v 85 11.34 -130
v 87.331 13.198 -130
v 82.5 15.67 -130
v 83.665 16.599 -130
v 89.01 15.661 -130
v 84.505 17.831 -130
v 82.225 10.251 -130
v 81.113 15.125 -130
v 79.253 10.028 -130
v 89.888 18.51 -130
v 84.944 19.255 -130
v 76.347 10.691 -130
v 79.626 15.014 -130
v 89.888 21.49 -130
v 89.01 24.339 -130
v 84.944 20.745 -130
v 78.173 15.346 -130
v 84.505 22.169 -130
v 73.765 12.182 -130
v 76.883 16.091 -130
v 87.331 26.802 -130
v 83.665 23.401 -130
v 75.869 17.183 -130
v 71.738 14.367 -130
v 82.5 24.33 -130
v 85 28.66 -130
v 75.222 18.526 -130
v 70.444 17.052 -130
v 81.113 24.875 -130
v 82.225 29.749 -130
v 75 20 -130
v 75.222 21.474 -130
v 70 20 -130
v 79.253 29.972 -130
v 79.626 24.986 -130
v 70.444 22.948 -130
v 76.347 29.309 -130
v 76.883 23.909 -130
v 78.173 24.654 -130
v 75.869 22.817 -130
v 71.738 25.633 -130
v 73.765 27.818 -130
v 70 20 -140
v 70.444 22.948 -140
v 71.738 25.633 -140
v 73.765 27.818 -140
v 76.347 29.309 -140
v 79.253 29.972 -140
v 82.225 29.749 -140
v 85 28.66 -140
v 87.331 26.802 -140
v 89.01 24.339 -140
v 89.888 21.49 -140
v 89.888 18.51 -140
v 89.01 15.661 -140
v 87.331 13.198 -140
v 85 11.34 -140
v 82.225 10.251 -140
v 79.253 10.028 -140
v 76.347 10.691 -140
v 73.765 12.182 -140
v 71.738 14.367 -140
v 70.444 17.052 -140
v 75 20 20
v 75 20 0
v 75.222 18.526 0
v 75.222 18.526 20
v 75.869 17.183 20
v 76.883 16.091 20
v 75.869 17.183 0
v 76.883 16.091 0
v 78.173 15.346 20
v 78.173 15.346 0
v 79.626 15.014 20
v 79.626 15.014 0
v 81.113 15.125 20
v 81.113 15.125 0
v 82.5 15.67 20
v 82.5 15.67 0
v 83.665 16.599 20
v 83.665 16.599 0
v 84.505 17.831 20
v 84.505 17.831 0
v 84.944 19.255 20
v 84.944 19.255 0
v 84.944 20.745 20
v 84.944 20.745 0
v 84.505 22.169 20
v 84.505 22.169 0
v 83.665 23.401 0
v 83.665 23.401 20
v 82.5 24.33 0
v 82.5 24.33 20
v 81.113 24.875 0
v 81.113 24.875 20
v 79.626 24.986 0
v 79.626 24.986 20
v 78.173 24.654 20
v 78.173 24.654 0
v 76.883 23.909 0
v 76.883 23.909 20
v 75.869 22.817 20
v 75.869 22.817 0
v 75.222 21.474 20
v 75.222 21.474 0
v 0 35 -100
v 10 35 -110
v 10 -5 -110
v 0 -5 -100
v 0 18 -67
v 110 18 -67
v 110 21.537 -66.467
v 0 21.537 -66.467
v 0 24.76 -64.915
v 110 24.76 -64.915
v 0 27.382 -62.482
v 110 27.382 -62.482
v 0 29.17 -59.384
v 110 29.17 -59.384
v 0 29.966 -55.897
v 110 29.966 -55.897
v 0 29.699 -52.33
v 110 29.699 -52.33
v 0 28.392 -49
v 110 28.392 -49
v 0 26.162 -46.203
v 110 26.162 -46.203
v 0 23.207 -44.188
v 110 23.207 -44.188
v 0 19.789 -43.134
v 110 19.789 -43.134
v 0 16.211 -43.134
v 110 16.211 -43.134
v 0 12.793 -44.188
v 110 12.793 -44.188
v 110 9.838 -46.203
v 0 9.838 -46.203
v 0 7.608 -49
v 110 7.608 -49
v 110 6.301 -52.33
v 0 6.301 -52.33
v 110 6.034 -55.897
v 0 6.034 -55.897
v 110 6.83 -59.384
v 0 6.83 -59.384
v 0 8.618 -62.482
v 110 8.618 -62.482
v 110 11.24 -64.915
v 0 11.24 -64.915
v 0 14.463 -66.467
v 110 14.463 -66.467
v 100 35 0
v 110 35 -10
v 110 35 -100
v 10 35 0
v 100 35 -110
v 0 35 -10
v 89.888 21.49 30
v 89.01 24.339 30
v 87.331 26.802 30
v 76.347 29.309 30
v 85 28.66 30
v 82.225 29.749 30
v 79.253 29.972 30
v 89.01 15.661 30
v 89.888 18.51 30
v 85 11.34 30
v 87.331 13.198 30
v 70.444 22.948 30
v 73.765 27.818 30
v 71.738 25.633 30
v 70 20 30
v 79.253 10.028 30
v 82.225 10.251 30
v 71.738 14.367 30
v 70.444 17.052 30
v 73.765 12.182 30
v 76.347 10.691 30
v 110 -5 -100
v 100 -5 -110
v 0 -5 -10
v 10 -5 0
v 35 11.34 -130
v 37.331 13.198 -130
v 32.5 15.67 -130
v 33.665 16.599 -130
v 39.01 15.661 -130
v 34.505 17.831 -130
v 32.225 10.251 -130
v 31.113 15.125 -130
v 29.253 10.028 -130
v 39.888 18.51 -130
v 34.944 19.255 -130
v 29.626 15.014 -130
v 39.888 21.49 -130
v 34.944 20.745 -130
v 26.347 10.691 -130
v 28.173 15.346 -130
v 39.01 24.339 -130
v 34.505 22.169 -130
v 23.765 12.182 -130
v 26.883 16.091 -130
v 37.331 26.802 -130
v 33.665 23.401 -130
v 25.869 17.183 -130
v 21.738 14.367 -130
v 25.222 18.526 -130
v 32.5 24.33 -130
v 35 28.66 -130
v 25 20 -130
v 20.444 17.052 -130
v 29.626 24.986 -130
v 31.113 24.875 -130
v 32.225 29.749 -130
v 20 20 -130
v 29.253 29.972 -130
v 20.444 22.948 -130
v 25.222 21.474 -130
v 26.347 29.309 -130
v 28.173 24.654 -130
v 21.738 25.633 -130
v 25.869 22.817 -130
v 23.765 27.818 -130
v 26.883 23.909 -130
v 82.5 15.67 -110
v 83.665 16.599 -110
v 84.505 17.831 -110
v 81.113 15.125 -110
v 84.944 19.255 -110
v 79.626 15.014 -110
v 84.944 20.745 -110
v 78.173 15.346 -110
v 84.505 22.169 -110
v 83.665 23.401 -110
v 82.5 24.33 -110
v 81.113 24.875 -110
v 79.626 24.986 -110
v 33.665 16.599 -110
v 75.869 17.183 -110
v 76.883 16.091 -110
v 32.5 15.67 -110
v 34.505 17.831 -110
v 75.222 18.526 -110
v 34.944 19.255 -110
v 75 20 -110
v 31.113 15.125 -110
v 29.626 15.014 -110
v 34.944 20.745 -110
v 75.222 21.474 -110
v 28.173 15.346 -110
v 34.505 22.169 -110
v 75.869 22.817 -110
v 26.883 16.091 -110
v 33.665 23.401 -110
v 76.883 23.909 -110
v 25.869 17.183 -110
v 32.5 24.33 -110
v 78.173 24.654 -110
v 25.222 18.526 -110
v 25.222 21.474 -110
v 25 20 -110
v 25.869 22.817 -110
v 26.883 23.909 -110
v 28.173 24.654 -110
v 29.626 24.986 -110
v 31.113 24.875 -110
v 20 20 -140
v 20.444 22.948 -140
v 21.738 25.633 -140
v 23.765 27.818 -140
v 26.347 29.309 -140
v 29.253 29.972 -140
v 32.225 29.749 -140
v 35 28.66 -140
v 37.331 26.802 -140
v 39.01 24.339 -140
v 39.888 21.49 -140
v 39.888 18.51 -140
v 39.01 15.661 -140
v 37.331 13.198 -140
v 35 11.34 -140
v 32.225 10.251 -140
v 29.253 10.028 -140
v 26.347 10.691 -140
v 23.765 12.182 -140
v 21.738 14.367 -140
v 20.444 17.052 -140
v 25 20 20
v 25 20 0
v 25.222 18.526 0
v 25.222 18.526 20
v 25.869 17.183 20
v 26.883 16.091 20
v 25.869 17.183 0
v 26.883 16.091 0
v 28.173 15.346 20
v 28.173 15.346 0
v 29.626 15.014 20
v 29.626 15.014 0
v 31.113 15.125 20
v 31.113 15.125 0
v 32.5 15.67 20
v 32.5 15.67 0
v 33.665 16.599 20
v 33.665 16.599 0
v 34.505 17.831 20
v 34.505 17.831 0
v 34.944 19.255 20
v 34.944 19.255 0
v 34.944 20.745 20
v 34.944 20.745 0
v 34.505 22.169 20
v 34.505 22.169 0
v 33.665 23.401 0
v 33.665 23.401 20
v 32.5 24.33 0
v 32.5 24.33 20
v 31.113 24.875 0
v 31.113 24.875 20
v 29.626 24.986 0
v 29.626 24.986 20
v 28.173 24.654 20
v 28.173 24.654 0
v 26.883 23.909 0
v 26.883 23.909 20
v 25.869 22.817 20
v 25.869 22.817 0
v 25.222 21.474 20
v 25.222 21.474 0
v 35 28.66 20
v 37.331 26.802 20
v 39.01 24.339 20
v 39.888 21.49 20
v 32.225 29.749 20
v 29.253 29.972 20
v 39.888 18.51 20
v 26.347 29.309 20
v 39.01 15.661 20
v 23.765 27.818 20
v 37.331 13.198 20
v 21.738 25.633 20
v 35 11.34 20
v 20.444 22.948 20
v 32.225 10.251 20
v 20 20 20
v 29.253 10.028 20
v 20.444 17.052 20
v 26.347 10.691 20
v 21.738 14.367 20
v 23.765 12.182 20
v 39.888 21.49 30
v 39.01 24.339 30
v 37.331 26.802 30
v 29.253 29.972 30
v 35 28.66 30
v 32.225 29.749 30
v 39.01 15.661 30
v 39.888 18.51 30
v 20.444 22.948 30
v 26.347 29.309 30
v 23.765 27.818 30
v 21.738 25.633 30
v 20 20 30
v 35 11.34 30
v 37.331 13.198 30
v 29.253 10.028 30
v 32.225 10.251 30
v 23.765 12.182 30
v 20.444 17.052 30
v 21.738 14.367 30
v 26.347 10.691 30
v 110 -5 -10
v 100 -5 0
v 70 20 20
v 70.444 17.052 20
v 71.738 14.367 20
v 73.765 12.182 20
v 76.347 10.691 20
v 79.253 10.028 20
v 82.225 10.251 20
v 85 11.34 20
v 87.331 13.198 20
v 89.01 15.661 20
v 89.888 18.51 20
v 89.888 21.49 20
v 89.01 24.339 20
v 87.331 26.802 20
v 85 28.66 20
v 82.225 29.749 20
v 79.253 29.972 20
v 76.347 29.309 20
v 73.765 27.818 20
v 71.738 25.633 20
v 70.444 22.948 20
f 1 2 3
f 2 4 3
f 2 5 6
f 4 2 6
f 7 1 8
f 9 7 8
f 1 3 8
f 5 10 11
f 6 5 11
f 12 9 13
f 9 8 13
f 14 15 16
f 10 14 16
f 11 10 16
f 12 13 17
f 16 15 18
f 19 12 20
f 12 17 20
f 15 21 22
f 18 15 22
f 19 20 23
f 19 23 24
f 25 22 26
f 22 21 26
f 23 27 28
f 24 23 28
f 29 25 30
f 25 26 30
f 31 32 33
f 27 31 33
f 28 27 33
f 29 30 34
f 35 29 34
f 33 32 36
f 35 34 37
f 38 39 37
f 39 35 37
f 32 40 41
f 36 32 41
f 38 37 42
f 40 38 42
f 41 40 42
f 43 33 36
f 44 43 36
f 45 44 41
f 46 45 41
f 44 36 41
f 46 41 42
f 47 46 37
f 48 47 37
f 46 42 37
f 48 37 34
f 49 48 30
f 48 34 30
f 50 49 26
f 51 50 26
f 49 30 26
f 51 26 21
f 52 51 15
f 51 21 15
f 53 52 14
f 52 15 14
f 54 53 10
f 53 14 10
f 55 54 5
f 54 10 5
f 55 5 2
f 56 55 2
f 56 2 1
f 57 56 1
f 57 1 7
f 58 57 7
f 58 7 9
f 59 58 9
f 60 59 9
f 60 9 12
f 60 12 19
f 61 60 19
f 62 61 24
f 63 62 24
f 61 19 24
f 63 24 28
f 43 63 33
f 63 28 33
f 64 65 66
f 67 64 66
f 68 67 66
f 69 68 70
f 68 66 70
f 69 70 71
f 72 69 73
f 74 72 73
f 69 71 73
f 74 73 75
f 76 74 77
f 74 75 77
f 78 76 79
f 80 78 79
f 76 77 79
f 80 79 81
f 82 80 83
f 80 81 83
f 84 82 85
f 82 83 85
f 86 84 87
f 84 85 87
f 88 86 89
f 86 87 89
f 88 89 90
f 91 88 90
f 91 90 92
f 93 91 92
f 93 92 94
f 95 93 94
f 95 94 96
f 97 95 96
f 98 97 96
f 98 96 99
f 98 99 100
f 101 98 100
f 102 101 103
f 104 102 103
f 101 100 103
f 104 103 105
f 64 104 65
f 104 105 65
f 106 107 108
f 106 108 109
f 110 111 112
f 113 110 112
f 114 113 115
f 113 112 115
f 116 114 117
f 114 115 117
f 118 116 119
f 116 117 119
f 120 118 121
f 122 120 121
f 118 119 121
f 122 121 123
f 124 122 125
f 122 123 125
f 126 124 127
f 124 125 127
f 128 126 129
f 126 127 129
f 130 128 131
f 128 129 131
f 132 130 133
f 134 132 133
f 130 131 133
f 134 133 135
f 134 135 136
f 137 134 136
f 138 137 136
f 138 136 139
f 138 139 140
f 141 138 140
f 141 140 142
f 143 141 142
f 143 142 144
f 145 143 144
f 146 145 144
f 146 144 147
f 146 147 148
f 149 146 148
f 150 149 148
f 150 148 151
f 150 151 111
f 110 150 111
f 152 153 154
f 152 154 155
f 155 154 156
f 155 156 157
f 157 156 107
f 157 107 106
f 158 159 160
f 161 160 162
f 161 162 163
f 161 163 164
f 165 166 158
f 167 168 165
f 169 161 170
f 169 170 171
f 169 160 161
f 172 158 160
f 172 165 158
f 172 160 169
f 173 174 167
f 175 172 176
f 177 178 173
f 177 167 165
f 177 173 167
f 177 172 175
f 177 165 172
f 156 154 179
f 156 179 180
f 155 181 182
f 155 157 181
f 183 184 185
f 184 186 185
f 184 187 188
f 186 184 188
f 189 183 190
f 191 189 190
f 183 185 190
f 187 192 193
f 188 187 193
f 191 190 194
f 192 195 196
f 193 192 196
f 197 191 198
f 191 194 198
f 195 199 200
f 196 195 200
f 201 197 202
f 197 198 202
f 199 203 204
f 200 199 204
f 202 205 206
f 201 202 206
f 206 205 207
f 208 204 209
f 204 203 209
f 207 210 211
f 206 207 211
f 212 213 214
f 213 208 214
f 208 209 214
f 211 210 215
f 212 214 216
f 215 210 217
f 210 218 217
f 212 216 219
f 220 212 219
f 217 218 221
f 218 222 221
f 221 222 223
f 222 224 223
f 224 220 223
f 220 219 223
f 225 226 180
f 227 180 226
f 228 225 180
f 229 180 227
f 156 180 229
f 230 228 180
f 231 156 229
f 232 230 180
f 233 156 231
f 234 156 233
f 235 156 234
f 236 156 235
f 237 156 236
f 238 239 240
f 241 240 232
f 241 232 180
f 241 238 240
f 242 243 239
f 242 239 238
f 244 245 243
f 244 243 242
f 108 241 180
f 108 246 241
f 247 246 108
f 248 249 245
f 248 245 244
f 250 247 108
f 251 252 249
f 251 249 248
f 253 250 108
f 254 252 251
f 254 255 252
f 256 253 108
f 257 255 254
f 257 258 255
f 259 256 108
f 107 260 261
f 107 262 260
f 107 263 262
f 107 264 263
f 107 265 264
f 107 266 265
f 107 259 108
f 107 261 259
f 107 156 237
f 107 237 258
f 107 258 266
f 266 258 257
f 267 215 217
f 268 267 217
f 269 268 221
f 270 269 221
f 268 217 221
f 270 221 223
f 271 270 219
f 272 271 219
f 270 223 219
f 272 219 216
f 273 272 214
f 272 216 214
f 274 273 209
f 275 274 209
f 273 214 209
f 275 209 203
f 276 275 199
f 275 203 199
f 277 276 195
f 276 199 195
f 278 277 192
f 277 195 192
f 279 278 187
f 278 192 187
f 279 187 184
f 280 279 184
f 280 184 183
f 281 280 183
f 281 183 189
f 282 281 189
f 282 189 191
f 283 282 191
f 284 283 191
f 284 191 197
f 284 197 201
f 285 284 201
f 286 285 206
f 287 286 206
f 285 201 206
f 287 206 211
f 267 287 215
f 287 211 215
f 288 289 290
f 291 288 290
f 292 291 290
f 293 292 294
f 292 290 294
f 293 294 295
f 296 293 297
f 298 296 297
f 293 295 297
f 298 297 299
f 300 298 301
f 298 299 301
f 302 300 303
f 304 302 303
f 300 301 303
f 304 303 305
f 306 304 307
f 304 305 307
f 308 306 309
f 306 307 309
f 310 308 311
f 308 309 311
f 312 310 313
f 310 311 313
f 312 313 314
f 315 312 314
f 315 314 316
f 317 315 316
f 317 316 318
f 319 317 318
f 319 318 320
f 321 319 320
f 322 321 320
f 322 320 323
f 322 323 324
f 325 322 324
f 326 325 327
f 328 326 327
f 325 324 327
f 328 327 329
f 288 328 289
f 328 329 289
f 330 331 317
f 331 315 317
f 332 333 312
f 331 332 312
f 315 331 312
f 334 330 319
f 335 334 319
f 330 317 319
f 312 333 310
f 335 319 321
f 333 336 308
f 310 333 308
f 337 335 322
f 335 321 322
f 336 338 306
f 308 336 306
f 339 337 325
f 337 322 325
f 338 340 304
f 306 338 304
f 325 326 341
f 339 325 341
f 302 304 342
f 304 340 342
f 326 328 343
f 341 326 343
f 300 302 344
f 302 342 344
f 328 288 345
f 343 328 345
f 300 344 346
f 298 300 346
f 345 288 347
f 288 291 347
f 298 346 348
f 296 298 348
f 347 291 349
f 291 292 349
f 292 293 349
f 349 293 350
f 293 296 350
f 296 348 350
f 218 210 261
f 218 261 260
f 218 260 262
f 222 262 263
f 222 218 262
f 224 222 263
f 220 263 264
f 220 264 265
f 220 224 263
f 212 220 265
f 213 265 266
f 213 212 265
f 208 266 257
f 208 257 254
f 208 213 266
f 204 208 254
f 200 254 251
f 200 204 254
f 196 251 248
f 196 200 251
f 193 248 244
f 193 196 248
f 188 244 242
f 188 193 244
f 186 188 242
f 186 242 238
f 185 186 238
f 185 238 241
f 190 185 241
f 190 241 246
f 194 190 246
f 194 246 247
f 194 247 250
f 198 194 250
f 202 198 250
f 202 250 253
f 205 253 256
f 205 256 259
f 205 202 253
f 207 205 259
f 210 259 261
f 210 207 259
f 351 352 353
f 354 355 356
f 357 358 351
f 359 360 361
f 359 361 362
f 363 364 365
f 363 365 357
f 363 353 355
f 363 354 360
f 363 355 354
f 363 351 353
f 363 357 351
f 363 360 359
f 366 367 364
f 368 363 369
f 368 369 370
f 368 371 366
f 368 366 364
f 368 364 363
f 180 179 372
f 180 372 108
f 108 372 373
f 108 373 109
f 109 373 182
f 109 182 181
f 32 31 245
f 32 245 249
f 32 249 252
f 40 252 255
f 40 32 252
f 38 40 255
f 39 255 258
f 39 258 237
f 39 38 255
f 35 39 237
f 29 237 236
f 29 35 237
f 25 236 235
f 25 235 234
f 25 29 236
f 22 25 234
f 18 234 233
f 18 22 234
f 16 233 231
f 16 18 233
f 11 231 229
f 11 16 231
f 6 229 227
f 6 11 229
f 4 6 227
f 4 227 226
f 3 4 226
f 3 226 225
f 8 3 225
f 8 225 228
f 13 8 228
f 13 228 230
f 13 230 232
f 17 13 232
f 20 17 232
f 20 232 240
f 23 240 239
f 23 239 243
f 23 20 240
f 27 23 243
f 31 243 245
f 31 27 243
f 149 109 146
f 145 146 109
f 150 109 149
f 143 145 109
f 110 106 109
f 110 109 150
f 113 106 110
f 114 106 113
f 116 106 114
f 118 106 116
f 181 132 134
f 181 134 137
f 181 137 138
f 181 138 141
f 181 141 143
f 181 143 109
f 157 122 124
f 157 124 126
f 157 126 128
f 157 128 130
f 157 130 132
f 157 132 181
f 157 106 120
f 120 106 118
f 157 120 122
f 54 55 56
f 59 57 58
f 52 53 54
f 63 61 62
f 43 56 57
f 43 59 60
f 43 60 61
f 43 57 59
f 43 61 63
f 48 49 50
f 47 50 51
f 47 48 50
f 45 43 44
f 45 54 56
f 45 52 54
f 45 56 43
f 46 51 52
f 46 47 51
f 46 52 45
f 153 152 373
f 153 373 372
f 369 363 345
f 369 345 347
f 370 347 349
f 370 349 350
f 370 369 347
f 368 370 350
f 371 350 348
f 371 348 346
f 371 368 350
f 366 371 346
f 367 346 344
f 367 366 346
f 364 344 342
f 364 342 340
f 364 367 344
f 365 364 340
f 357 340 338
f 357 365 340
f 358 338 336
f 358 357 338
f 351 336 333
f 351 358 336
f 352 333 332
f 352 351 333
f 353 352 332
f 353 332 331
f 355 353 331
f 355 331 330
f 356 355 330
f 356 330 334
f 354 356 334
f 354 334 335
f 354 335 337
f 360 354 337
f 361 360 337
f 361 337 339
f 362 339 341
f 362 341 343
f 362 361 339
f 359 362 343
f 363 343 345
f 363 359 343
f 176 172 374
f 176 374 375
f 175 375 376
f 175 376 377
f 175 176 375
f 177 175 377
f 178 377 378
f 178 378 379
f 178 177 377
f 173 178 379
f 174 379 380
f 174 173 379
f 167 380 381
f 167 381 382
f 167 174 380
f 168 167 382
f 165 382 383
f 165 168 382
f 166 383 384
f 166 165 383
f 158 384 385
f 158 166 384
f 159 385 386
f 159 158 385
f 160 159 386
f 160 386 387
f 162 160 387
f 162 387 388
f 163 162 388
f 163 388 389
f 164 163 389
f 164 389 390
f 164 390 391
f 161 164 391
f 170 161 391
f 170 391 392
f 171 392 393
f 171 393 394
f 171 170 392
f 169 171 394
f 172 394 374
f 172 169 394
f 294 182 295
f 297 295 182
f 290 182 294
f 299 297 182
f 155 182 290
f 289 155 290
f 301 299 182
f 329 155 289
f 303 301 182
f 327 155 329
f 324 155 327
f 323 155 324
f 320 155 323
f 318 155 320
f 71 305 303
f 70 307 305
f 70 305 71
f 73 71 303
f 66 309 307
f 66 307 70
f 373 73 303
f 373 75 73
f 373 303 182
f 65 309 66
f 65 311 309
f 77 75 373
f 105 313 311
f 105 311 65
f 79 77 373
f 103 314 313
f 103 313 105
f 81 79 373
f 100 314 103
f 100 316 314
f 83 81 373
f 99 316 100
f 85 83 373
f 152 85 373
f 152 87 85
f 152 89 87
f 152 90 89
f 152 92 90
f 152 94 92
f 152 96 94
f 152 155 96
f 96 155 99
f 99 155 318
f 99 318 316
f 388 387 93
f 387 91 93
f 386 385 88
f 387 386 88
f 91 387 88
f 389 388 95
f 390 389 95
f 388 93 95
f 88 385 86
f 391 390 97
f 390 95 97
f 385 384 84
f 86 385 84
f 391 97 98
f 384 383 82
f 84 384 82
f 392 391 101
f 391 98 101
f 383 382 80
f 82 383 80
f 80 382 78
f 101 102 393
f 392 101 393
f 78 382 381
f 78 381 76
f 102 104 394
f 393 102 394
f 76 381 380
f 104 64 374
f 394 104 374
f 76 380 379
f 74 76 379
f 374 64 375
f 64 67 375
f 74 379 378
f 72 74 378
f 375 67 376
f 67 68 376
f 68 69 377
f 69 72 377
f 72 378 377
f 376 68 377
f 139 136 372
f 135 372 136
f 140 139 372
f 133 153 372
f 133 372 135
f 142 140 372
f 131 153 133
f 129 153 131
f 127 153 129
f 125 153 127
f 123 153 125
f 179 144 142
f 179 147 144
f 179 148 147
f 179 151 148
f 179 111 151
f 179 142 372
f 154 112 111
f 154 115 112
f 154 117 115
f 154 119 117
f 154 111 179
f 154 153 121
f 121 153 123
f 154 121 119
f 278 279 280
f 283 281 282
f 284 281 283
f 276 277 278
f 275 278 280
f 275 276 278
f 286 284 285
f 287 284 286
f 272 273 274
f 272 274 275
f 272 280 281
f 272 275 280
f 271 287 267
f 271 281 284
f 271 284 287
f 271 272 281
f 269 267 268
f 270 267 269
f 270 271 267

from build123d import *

# Parameters (mm, degrees)
SKETCH2_W           = 110
SKETCH2_H           = 110
BOSS_EXTRUDE1_DEPTH = 30
CHAMFER1_SIZE       = 10
SKETCH3_R           = 5
BOSS_EXTRUDE2_DEPTH = 20
BOSS_EXTRUDE3_START = 20
SKETCH4_R           = 5
BOSS_EXTRUDE3_DEPTH = 20
SKETCH5_R           = 10
BOSS_EXTRUDE4_DEPTH = 10
BOSS_EXTRUDE5_START = 10
SKETCH6_R           = 10
BOSS_EXTRUDE5_DEPTH = 10
BOSS_EXTRUDE6_DEPTH = 5
BOSS_EXTRUDE7_DEPTH = 5
SKETCH15_R          = 12
CUT_EXTRUDE1_DEPTH  = 200


with BuildPart() as part:
    # Sketch2 → Boss-Extrude1 (new body)
    with BuildSketch(Plane(origin=(0, 0, 0), x_dir=(1, 0, 0), z_dir=(0, 1, 0))):
        with Locations((55, 55)):
            Rectangle(SKETCH2_W, SKETCH2_H)
    extrude(amount=BOSS_EXTRUDE1_DEPTH)

    # Chamfer1
    chamfer1_edges = [part.edges().sort_by_distance(p)[0] for p in [
        (0, 15, -110),
        (110, 15, -110),
        (110, 15, 0),
        (0, 15, 0),
    ]]
    chamfer(chamfer1_edges, length=CHAMFER1_SIZE)

    # Sketch3 → Boss-Extrude2 (add)
    with BuildSketch(Plane.XY):
        with Locations(Location((30, 20, 0), (0, 0, 180))):
            Circle(SKETCH3_R)
        with Locations(Location((80, 20, 0), (0, 0, 180))):
            Circle(SKETCH3_R)
    extrude(amount=BOSS_EXTRUDE2_DEPTH)

    # Sketch4 → Boss-Extrude3 (add)
    with BuildSketch(Plane(origin=(0, 0, -110), x_dir=(-1, 0, 0), z_dir=(0, 0, -1)).offset(BOSS_EXTRUDE3_START)):
        with Locations((-80, 20)):
            Circle(SKETCH4_R)
        with Locations((-30, 20)):
            Circle(SKETCH4_R)
    extrude(amount=-BOSS_EXTRUDE3_DEPTH)

    # Sketch5 → Boss-Extrude4 (add)
    with BuildSketch(Plane(origin=(0, 0, -130), x_dir=(-1, 0, 0), z_dir=(0, 0, -1))):
        with Locations((-80, 20)):
            Circle(SKETCH5_R)
        with Locations((-30, 20)):
            Circle(SKETCH5_R)
    extrude(amount=BOSS_EXTRUDE4_DEPTH)

    # Sketch6 → Boss-Extrude5 (add)
    with BuildSketch(Plane.XY.offset(20).offset(BOSS_EXTRUDE5_START)):
        with Locations(Location((30, 20, 0), (0, 0, 180))):
            Circle(SKETCH6_R)
        with Locations(Location((80, 20, 0), (0, 0, 180))):
            Circle(SKETCH6_R)
    extrude(amount=-BOSS_EXTRUDE5_DEPTH)

    # Sketch9 → Boss-Extrude6 (add)
    with BuildSketch(Plane(origin=(0, 30, 0), x_dir=(1, 0, 0), z_dir=(0, 1, 0))):
        Polygon((10, 110), (100, 110), (110, 100), (110, 10), (100, 0), (10, 0), (0, 10), (0, 100), align=None)
    extrude(amount=BOSS_EXTRUDE6_DEPTH)

    # Sketch10 → Boss-Extrude7 (add)
    with BuildSketch(Plane.XZ):
        Polygon((10, 0), (100, 0), (110, -10), (110, -100), (100, -110), (10, -110), (0, -100), (0, -10), align=None)
    extrude(amount=BOSS_EXTRUDE7_DEPTH)

    # Sketch15 → Cut-Extrude1 (cut)
    with BuildSketch(Plane(origin=(110, 0, 0), x_dir=(0, 0, -1), z_dir=(1, 0, 0))):
        with Locations((55, 18)):
            Circle(SKETCH15_R)
    extrude(amount=-CUT_EXTRUDE1_DEPTH, mode=Mode.SUBTRACT)


solid = part.part
